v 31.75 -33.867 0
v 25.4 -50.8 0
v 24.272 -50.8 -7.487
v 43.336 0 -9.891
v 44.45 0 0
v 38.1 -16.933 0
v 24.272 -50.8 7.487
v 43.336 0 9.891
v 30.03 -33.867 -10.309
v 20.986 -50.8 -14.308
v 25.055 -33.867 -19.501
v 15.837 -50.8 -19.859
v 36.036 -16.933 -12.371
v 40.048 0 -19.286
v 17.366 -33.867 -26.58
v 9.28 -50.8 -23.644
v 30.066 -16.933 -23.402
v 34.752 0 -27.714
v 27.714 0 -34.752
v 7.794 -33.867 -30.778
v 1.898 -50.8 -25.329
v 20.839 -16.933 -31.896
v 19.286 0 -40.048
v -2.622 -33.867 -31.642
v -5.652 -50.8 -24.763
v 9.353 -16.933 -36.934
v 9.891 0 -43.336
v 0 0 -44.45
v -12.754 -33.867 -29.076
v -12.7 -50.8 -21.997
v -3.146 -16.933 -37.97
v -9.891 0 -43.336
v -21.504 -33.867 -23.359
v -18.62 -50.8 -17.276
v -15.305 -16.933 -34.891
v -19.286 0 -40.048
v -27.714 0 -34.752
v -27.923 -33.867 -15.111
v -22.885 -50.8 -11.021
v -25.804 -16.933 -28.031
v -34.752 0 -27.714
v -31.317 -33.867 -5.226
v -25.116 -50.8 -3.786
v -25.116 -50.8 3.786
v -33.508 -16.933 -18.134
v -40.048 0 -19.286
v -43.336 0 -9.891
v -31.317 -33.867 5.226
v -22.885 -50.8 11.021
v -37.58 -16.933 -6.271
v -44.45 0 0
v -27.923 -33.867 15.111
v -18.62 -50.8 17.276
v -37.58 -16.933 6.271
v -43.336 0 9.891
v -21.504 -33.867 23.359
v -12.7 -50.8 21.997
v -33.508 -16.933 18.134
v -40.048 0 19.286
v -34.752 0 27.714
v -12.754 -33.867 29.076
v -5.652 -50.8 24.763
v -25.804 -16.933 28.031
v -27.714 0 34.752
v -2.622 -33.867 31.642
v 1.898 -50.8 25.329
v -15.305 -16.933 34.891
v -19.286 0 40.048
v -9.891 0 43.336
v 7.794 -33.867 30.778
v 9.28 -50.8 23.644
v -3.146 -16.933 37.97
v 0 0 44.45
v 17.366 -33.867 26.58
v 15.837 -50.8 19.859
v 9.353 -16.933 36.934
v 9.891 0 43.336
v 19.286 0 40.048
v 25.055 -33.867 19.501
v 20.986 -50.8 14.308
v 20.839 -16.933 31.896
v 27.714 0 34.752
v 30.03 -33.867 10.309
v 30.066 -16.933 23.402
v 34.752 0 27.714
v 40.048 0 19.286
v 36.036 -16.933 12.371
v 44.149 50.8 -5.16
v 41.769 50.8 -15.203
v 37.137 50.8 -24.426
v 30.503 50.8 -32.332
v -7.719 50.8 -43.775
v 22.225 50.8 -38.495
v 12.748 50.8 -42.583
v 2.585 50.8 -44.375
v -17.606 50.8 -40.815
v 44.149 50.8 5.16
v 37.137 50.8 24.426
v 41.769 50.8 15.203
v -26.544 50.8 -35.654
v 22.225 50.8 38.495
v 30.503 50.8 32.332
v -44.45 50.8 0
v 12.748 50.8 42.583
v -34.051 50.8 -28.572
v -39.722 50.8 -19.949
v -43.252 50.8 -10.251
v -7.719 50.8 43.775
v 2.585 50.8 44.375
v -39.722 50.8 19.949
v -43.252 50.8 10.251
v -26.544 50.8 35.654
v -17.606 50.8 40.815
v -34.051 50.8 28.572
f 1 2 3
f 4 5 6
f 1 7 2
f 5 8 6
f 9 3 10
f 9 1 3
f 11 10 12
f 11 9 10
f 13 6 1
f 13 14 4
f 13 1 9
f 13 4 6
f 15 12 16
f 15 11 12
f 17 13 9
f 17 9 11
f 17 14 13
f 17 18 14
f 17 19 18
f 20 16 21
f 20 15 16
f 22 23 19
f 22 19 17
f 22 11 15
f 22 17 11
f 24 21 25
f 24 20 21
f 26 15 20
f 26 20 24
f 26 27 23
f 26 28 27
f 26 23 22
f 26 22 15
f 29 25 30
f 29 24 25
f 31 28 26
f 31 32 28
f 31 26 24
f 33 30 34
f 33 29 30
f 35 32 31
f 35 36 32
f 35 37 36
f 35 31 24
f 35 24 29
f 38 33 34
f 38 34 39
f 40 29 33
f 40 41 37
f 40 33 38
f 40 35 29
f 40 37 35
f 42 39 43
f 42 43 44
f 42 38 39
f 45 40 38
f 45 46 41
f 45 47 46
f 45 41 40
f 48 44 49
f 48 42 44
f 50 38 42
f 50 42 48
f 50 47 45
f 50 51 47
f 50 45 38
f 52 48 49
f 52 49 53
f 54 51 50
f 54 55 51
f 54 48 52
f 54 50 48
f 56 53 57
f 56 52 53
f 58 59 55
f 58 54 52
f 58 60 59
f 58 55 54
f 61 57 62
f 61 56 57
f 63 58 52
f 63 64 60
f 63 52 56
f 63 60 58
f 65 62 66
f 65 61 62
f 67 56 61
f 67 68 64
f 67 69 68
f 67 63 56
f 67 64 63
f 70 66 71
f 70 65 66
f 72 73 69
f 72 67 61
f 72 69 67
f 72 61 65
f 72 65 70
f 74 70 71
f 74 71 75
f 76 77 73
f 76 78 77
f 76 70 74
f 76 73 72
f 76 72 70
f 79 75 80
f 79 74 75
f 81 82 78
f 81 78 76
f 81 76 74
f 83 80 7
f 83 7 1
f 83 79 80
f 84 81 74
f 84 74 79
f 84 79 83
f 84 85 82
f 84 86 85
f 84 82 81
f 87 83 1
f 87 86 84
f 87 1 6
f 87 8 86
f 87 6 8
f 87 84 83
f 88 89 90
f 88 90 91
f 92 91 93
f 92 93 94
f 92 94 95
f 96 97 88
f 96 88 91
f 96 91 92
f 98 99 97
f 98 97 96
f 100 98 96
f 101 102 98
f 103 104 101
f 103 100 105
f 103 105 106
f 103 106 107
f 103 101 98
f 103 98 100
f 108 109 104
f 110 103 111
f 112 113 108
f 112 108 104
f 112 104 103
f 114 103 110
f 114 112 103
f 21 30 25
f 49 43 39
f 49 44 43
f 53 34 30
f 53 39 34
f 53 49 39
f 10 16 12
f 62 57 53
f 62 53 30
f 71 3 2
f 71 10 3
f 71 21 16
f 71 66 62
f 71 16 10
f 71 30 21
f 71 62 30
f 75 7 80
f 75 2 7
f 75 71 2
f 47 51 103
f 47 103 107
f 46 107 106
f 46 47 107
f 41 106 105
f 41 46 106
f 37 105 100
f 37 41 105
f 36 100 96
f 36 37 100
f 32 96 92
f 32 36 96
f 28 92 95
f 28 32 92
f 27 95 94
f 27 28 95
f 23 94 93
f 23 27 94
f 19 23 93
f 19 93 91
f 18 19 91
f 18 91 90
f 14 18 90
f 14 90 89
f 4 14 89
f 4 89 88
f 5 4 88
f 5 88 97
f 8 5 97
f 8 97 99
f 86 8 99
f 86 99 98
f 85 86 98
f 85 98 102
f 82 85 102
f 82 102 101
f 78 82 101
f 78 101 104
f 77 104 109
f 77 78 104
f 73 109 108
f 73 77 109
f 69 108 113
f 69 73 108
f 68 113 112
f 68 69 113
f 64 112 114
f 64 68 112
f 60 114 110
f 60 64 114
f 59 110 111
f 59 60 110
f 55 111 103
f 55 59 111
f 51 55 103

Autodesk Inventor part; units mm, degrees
ref_plane "YZ Plane" through (0, 0, 0) normal (1, 0, 0) x (0, 1, 0)
ref_plane "XZ Plane" through (0, 0, 0) normal (0, 1, 0) x (-1, 0, 0)
ref_plane "XY Plane" through (0, 0, 0) normal (0, 0, 1) x (1, 0, 0)
sketch "Sketch1" plane through (0, 0, 0) normal (0, 1, 0) x (-1, 0, 0)
  circle A0 centre (0, 0) radius 44.45
  dimension "d0" = 88.9
extrude "Extrusion1" add sketch "Sketch1" along normal blind 50.8
sketch "Sketch2" plane through (0, 0, 0) normal (0, -1, 0) x (1, 0, 0)
  circle A0 centre (0, 0) radius 25.4
  dimension "d3" = 50.8
extrude "Extrusion2" add sketch "Sketch2" along normal blind 50.8
loft "Loft1" add section 1 edges at (-25.4, -50.8, 0) section 2 edges at (44.45, 0, 0)
properties part number "Thing2"
